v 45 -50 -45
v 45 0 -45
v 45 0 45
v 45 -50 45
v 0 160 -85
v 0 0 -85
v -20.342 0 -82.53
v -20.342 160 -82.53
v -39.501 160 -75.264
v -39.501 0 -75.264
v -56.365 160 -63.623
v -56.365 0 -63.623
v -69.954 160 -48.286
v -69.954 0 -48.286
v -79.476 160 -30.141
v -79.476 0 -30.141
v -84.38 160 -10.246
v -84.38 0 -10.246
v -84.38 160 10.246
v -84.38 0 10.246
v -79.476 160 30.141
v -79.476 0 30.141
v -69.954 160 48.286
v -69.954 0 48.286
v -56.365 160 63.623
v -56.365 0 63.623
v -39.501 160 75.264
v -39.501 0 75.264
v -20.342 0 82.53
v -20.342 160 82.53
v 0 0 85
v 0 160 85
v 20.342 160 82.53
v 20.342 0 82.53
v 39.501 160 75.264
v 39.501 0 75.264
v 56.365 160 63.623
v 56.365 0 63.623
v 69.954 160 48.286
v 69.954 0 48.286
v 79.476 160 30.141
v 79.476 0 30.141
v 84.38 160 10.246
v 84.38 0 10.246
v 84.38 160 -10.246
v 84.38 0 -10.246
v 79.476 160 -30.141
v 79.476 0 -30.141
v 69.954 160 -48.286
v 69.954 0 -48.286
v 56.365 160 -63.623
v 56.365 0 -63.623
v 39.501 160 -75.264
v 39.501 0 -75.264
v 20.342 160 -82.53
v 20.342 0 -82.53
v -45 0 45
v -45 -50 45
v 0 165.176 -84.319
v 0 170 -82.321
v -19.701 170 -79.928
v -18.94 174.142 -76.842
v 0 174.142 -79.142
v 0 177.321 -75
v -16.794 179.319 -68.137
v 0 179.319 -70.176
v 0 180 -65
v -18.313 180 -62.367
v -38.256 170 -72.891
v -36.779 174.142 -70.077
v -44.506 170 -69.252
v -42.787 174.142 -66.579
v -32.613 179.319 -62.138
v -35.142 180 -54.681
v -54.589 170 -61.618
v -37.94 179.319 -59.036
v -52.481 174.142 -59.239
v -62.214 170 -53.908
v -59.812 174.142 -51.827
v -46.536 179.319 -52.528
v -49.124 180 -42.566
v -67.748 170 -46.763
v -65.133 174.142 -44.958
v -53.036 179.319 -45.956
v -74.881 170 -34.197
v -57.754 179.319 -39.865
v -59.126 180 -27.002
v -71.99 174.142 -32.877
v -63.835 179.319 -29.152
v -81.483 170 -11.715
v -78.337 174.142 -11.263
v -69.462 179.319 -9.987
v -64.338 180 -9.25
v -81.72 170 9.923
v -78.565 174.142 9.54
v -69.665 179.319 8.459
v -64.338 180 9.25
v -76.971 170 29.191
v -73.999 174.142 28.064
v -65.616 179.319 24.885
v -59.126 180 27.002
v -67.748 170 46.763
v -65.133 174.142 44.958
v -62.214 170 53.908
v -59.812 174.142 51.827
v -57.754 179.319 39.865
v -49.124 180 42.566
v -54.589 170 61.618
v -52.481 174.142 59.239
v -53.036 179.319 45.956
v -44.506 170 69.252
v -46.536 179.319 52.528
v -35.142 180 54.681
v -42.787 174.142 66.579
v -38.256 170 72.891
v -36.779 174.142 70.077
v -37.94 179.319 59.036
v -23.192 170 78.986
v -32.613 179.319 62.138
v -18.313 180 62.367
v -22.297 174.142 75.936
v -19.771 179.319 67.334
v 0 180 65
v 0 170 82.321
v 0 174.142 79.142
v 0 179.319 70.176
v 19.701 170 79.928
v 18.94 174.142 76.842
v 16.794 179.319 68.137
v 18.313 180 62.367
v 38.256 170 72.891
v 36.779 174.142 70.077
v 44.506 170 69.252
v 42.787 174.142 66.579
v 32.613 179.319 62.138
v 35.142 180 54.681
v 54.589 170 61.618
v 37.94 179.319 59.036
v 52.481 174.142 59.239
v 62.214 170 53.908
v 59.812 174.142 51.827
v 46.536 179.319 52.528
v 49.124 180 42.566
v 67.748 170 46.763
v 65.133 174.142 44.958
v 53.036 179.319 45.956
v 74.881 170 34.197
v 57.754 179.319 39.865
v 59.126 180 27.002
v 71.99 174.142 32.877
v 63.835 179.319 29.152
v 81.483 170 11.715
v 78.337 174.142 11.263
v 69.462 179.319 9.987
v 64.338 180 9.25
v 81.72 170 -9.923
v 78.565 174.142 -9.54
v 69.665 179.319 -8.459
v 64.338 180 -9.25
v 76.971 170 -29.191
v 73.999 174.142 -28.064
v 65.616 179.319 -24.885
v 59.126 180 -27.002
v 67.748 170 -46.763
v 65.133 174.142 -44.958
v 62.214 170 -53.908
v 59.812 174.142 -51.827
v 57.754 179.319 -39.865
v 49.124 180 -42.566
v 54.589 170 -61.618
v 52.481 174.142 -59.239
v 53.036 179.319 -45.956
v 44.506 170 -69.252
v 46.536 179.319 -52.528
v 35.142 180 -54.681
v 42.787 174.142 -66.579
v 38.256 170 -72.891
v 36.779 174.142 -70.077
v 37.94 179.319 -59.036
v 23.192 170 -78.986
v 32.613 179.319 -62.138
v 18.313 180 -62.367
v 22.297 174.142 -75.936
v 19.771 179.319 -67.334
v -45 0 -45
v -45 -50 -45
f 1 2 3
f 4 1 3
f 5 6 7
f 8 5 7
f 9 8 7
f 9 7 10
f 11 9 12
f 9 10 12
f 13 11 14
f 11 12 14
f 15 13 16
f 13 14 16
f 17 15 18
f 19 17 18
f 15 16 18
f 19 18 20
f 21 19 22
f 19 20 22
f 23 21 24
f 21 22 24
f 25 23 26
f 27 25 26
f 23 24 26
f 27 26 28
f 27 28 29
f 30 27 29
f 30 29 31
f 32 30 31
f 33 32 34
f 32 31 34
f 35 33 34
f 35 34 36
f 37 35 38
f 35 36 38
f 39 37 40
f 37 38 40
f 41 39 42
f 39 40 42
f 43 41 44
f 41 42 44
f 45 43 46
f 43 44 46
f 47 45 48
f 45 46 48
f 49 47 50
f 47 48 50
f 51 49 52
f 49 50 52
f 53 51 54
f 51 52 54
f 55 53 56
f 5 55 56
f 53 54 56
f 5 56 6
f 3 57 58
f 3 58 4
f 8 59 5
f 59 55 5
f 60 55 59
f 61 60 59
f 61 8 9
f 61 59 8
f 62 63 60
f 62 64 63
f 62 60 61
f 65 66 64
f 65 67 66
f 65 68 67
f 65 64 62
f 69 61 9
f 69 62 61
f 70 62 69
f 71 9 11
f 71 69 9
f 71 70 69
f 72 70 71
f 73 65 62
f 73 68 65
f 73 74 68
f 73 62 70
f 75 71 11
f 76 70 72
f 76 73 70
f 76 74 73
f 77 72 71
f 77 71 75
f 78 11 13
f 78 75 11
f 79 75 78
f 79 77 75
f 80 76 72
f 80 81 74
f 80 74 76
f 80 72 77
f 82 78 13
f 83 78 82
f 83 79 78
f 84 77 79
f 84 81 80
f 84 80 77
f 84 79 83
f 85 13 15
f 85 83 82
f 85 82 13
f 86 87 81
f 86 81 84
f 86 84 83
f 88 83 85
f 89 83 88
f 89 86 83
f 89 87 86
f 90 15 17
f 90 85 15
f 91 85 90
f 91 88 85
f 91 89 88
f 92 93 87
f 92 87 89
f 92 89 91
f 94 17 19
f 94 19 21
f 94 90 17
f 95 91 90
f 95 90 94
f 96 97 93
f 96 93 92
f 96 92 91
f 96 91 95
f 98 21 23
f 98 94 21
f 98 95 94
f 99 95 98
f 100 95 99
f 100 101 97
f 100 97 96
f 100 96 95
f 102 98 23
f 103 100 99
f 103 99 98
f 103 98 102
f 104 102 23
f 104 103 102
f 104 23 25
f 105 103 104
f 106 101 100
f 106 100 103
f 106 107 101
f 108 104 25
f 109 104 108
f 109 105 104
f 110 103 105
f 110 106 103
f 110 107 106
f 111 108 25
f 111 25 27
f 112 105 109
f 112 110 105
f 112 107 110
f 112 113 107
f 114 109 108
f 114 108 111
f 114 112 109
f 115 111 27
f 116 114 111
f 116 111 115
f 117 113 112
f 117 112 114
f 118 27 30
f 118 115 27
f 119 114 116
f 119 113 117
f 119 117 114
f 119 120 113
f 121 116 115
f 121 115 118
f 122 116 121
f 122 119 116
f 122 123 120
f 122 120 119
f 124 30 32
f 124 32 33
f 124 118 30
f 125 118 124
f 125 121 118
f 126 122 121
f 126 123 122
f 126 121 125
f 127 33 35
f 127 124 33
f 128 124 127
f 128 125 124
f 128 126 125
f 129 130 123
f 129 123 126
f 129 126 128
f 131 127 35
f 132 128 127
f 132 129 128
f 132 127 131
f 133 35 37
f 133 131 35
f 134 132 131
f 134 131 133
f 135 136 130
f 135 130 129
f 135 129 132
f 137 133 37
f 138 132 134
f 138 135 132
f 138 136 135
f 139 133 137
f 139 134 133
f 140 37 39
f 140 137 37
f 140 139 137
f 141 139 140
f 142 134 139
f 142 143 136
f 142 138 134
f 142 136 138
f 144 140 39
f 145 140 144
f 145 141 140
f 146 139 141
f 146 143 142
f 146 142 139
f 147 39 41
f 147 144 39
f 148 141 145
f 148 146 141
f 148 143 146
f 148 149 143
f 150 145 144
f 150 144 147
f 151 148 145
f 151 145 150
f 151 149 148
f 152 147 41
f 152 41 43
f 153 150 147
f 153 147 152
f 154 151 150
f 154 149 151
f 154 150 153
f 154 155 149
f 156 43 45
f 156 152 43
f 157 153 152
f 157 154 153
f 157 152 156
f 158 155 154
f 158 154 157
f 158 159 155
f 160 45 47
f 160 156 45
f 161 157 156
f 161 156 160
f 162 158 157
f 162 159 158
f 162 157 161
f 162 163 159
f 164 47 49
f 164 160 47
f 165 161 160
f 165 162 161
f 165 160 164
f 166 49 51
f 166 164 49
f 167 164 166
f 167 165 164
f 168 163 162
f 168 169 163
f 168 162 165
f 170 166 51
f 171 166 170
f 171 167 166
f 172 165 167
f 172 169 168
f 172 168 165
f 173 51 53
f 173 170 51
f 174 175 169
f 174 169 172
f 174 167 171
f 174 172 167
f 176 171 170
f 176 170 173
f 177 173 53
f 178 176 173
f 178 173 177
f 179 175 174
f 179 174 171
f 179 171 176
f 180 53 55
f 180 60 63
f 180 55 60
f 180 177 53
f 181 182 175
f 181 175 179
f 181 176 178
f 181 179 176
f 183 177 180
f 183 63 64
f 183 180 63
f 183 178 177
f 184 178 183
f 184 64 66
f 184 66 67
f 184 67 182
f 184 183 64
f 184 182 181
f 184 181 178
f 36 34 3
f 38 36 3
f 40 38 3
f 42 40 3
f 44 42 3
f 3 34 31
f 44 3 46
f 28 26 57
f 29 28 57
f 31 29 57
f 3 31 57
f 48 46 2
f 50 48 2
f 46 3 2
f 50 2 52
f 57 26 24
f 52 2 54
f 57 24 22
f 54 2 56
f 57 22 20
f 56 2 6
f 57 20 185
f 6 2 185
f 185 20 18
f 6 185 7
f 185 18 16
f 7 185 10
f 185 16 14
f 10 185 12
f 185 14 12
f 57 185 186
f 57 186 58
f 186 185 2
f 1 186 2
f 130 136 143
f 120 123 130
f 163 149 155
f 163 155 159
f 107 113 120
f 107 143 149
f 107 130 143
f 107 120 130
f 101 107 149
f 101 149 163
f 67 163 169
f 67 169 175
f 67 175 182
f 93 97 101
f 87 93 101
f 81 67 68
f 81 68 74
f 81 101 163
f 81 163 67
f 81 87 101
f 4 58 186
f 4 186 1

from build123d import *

# Parameters (mm, degrees)
SKETCH1_R           = 85
BOSS_EXTRUDE2_DEPTH = 180
SKETCH2_W           = 90
SKETCH2_H           = 90
BOSS_EXTRUDE3_DEPTH = 50
FILLET1_R           = 20


with BuildPart() as part:
    # Sketch1 → Boss-Extrude2 (new body)
    with BuildSketch(Plane(origin=(0, 0, 0), x_dir=(1, 0, 0), z_dir=(0, 1, 0))):
        with Locations(Location((0, 0, 0), (0, 0, 90))):
            Circle(SKETCH1_R)
    extrude(amount=BOSS_EXTRUDE2_DEPTH)

    # Sketch2 → Boss-Extrude3 (add)
    with BuildSketch(Plane.XZ):
        Rectangle(SKETCH2_W, SKETCH2_H)
    extrude(amount=BOSS_EXTRUDE3_DEPTH)

    # Fillet1
    fillet1_edges = [part.edges().sort_by_distance(p)[0] for p in [
        (0, 180, 85),
    ]]
    fillet(fillet1_edges, radius=FILLET1_R)


solid = part.part
